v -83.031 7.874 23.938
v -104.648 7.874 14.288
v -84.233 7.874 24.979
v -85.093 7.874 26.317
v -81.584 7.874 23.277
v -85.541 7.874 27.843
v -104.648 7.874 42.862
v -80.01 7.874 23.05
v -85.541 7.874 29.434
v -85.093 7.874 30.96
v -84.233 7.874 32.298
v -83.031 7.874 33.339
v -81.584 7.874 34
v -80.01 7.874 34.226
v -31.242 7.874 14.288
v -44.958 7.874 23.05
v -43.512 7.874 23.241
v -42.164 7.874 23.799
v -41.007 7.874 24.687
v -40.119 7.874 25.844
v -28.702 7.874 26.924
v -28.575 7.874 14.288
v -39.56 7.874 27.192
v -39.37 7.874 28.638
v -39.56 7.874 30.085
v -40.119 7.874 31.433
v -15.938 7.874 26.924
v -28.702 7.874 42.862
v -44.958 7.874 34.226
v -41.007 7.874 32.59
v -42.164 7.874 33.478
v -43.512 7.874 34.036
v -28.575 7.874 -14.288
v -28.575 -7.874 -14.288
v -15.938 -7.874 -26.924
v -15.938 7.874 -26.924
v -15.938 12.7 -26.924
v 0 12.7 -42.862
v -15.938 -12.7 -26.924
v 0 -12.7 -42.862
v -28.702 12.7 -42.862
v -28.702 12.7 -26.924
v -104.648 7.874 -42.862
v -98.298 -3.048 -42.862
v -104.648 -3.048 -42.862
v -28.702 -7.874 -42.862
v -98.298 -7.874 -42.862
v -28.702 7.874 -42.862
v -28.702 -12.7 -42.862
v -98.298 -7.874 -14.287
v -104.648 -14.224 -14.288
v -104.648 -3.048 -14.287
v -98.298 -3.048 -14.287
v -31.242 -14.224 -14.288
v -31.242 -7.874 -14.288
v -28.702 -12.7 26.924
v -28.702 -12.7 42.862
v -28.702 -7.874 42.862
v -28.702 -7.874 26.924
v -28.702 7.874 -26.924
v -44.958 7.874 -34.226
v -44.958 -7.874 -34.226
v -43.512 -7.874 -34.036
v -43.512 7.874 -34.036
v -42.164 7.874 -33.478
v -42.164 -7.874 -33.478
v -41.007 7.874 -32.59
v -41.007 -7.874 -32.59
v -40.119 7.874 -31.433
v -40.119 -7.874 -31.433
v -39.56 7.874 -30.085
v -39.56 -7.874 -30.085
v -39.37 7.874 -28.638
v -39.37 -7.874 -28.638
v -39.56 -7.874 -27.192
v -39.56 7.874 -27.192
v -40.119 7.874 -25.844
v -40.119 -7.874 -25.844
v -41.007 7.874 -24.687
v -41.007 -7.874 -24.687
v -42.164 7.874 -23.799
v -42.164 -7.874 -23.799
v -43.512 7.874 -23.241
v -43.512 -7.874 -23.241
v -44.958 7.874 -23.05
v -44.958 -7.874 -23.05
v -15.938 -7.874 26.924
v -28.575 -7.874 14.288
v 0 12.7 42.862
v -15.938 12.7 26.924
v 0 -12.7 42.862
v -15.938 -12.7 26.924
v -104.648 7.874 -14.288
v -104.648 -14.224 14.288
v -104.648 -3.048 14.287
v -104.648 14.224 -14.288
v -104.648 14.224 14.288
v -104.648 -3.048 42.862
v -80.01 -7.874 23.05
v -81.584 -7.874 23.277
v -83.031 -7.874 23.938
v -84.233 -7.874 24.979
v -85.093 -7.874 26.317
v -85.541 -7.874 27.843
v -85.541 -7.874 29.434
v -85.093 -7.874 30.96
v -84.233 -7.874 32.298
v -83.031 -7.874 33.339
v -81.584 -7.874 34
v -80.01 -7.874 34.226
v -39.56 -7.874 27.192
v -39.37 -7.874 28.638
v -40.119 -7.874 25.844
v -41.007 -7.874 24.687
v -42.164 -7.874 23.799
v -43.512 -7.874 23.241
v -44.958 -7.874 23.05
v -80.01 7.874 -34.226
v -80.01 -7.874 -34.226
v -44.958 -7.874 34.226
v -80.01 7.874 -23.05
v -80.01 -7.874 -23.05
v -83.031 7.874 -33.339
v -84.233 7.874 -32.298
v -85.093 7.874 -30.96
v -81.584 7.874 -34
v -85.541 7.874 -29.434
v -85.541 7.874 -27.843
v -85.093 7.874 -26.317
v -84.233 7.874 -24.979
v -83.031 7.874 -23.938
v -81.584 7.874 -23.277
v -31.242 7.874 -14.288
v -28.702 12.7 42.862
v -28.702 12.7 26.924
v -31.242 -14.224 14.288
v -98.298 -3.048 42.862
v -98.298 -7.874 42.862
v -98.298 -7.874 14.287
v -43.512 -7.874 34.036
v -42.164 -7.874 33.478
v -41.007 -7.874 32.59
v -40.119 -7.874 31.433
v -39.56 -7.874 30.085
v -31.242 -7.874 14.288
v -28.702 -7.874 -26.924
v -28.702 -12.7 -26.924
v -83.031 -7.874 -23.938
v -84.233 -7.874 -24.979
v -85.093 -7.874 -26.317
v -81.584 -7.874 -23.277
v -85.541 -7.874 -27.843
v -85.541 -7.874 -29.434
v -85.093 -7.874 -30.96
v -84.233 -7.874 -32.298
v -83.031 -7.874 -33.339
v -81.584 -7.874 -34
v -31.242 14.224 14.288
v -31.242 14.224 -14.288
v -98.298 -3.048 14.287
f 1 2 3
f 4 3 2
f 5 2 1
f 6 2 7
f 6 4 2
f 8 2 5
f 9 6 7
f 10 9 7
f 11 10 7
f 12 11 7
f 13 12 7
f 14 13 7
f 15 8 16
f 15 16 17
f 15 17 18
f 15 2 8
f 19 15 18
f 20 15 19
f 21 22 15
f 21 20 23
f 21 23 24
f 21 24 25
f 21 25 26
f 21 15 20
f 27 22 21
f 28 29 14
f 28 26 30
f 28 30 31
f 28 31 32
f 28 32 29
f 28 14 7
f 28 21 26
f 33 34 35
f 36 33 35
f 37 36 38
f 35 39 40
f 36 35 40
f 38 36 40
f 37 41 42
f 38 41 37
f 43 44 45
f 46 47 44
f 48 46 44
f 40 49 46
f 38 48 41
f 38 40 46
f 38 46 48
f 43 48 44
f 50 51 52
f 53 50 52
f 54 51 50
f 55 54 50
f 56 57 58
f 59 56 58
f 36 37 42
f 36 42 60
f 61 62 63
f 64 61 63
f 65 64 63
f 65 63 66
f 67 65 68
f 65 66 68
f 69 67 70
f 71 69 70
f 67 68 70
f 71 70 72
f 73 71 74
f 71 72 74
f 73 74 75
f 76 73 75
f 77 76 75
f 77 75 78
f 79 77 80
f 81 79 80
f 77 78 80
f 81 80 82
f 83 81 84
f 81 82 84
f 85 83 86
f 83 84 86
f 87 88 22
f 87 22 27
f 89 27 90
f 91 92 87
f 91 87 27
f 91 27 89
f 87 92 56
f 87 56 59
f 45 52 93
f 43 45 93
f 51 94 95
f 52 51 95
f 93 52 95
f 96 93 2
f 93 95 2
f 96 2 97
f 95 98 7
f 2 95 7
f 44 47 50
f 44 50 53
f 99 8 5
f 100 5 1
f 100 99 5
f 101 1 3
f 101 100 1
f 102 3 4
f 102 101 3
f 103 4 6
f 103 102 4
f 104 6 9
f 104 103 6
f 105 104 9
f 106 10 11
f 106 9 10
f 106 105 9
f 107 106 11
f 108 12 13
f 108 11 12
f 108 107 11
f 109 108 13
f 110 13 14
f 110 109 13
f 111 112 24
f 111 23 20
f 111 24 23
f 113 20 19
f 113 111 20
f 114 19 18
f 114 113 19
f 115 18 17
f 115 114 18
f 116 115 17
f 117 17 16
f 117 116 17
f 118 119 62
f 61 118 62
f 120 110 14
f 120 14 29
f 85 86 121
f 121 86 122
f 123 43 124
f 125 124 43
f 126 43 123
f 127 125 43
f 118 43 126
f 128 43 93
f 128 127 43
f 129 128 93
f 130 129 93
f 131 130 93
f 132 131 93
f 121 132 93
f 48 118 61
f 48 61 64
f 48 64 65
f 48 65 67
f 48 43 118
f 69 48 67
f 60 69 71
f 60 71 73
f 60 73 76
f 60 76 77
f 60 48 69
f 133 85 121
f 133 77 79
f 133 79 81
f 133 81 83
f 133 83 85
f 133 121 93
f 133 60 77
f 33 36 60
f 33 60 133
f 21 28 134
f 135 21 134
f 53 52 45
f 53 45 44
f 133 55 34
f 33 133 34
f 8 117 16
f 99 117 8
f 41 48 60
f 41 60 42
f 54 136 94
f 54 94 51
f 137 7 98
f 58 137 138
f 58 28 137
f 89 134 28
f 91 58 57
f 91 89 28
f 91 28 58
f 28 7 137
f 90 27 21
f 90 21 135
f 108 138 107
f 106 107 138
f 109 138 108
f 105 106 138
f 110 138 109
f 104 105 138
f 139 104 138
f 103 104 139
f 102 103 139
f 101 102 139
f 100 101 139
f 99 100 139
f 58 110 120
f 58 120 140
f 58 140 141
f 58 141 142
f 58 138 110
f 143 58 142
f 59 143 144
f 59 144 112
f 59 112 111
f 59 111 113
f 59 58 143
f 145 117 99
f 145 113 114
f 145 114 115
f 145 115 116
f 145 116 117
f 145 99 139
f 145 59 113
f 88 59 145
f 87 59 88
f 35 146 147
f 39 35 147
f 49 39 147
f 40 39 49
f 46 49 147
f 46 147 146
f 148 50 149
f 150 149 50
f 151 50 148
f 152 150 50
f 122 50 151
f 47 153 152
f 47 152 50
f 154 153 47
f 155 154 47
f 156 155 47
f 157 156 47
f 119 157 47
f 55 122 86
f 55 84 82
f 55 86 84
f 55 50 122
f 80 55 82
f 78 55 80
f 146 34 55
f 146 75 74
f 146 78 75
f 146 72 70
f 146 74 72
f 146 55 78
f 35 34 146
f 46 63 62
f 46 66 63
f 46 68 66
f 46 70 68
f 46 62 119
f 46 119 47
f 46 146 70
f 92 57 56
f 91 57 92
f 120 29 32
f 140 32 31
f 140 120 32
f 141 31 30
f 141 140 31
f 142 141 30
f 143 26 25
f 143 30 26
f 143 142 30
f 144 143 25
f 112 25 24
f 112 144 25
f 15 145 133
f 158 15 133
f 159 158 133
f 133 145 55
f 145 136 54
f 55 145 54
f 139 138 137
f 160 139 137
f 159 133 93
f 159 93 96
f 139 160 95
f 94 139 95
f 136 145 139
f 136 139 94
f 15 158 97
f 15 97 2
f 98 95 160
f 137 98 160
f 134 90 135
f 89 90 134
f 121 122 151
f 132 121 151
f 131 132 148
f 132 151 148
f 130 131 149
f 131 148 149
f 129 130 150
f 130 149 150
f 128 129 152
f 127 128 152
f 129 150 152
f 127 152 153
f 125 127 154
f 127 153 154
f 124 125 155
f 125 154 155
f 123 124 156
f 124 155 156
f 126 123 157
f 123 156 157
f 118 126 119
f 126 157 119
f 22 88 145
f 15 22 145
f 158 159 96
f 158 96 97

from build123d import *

# Parameters (mm, degrees)
F1_DEPTH = 104.648
F2_W     = 75.946
F2_H     = 4.826
F2_W_2   = 6.35
F3_DEPTH = 28.575
F5_DEPTH = 22.099
F7_DEPTH = 26.925
F9_DEPTH = 28.449


# Not quite as in the source:
# - a pattern or mirror of a feature is missing from the dataset's text; its kind, count and spacing are read off the source's solid


with BuildPart() as f1:
    # F0 (on Right) → F1 (new body)
    with BuildSketch(Plane.YZ):
        Polygon((7.874, -14.2875), (14.224, -14.2875), (14.224, 14.2875), (7.874, 14.2875), (-7.874, 14.2875), (-14.224, 14.2875), (-14.224, -14.2875), (-7.874, -14.2875), align=None)
        Polygon((-7.874, 14.2875), (7.874, 14.2875), (7.874, 26.924), (12.7, 26.924), (12.7, 42.8625), (0, 42.8625), (-12.7, 42.8625), (-12.7, 26.924), (-7.874, 26.924), align=None)
        Polygon((7.874, -26.924), (7.874, -14.2875), (-7.874, -14.2875), (-7.874, -26.924), (-12.7, -26.924), (-12.7, -42.8625), (0, -42.8625), (12.7, -42.8625), (12.7, -26.924), align=None)
    extrude(amount=-F1_DEPTH)

    # F2 (on face) → F3 (cut)
    with BuildSketch(Plane.XY.offset(42.8625)):
        Polygon((-98.298, -7.874), (-104.648, -7.874), (-104.648, -12.7), (-28.702, -12.7), (-28.702, -7.874), align=None)
        with Locations((-66.675, 10.287)):
            Rectangle(F2_W, F2_H)
        with Locations((-101.473, -5.461)):
            Rectangle(F2_W_2, F2_H)
    f3 = extrude(amount=-F3_DEPTH, mode=Mode.SUBTRACT)

    # F3_copies: F3 across plane
    add(f3.mirror(Plane(origin=(0, 0, 0), x_dir=(-1, 0, 0), z_dir=(0, 0, -1))), mode=Mode.SUBTRACT)

    # F4 (on face) → F5 (cut, through all)
    with BuildSketch(Plane.XZ.offset(7.874)):
        with BuildLine():
            ThreePointArc((-80.01, -34.2265), (-76.0586873067, -32.5898126933), (-74.422, -28.6385))
            ThreePointArc((-74.422, -28.6385), (-76.0586873067, -24.6871873067), (-80.01, -23.0505))
            ThreePointArc((-80.01, -23.0505), (-85.598, -28.6385), (-80.01, -34.2265))
        make_face()
        with BuildLine():
            ThreePointArc((-80.01, -23.0505), (-76.0586873067, -24.6871873067), (-74.422, -28.6385))
            ThreePointArc((-74.422, -28.6385), (-76.0586873067, -32.5898126933), (-80.01, -34.2265))
            Line((-80.01, -34.2265), (-44.958, -34.2265))
            ThreePointArc((-44.958, -34.2265), (-50.546, -28.6385), (-44.958, -23.0505))
            Line((-44.958, -23.0505), (-80.01, -23.0505))
        make_face()
        with BuildLine():
            ThreePointArc((-39.37, -28.6385), (-41.0066873067, -24.6871873067), (-44.958, -23.0505))
            ThreePointArc((-44.958, -23.0505), (-50.546, -28.6385), (-44.958, -34.2265))
            ThreePointArc((-44.958, -34.2265), (-41.0066873067, -32.5898126933), (-39.37, -28.6385))
        make_face()
    f5 = extrude(amount=-F5_DEPTH, mode=Mode.SUBTRACT)

    # F5_copies: F5 across plane
    add(f5.mirror(Plane.XY), mode=Mode.SUBTRACT)

    # F6 (on face) → F7 (cut, through all)
    with BuildSketch(Plane.XZ.offset(12.7)):
        Polygon((0, -14.2875), (-28.575, -14.2875), (0, -42.8625), align=None)
    f7 = extrude(amount=-F7_DEPTH, mode=Mode.SUBTRACT)

    # F7_copies: F7 across plane
    add(f7.mirror(Plane.XY), mode=Mode.SUBTRACT)

    # F8 (on face) → F9 (cut, through all)
    with BuildSketch(Plane.XZ.offset(14.224)):
        Polygon((-31.242, 14.2875), (-31.242, 0), (-31.242, -14.2875), (0, -14.2875), (0, 14.2875), align=None)
    extrude(amount=-F9_DEPTH, mode=Mode.SUBTRACT)


solid = f1.part
